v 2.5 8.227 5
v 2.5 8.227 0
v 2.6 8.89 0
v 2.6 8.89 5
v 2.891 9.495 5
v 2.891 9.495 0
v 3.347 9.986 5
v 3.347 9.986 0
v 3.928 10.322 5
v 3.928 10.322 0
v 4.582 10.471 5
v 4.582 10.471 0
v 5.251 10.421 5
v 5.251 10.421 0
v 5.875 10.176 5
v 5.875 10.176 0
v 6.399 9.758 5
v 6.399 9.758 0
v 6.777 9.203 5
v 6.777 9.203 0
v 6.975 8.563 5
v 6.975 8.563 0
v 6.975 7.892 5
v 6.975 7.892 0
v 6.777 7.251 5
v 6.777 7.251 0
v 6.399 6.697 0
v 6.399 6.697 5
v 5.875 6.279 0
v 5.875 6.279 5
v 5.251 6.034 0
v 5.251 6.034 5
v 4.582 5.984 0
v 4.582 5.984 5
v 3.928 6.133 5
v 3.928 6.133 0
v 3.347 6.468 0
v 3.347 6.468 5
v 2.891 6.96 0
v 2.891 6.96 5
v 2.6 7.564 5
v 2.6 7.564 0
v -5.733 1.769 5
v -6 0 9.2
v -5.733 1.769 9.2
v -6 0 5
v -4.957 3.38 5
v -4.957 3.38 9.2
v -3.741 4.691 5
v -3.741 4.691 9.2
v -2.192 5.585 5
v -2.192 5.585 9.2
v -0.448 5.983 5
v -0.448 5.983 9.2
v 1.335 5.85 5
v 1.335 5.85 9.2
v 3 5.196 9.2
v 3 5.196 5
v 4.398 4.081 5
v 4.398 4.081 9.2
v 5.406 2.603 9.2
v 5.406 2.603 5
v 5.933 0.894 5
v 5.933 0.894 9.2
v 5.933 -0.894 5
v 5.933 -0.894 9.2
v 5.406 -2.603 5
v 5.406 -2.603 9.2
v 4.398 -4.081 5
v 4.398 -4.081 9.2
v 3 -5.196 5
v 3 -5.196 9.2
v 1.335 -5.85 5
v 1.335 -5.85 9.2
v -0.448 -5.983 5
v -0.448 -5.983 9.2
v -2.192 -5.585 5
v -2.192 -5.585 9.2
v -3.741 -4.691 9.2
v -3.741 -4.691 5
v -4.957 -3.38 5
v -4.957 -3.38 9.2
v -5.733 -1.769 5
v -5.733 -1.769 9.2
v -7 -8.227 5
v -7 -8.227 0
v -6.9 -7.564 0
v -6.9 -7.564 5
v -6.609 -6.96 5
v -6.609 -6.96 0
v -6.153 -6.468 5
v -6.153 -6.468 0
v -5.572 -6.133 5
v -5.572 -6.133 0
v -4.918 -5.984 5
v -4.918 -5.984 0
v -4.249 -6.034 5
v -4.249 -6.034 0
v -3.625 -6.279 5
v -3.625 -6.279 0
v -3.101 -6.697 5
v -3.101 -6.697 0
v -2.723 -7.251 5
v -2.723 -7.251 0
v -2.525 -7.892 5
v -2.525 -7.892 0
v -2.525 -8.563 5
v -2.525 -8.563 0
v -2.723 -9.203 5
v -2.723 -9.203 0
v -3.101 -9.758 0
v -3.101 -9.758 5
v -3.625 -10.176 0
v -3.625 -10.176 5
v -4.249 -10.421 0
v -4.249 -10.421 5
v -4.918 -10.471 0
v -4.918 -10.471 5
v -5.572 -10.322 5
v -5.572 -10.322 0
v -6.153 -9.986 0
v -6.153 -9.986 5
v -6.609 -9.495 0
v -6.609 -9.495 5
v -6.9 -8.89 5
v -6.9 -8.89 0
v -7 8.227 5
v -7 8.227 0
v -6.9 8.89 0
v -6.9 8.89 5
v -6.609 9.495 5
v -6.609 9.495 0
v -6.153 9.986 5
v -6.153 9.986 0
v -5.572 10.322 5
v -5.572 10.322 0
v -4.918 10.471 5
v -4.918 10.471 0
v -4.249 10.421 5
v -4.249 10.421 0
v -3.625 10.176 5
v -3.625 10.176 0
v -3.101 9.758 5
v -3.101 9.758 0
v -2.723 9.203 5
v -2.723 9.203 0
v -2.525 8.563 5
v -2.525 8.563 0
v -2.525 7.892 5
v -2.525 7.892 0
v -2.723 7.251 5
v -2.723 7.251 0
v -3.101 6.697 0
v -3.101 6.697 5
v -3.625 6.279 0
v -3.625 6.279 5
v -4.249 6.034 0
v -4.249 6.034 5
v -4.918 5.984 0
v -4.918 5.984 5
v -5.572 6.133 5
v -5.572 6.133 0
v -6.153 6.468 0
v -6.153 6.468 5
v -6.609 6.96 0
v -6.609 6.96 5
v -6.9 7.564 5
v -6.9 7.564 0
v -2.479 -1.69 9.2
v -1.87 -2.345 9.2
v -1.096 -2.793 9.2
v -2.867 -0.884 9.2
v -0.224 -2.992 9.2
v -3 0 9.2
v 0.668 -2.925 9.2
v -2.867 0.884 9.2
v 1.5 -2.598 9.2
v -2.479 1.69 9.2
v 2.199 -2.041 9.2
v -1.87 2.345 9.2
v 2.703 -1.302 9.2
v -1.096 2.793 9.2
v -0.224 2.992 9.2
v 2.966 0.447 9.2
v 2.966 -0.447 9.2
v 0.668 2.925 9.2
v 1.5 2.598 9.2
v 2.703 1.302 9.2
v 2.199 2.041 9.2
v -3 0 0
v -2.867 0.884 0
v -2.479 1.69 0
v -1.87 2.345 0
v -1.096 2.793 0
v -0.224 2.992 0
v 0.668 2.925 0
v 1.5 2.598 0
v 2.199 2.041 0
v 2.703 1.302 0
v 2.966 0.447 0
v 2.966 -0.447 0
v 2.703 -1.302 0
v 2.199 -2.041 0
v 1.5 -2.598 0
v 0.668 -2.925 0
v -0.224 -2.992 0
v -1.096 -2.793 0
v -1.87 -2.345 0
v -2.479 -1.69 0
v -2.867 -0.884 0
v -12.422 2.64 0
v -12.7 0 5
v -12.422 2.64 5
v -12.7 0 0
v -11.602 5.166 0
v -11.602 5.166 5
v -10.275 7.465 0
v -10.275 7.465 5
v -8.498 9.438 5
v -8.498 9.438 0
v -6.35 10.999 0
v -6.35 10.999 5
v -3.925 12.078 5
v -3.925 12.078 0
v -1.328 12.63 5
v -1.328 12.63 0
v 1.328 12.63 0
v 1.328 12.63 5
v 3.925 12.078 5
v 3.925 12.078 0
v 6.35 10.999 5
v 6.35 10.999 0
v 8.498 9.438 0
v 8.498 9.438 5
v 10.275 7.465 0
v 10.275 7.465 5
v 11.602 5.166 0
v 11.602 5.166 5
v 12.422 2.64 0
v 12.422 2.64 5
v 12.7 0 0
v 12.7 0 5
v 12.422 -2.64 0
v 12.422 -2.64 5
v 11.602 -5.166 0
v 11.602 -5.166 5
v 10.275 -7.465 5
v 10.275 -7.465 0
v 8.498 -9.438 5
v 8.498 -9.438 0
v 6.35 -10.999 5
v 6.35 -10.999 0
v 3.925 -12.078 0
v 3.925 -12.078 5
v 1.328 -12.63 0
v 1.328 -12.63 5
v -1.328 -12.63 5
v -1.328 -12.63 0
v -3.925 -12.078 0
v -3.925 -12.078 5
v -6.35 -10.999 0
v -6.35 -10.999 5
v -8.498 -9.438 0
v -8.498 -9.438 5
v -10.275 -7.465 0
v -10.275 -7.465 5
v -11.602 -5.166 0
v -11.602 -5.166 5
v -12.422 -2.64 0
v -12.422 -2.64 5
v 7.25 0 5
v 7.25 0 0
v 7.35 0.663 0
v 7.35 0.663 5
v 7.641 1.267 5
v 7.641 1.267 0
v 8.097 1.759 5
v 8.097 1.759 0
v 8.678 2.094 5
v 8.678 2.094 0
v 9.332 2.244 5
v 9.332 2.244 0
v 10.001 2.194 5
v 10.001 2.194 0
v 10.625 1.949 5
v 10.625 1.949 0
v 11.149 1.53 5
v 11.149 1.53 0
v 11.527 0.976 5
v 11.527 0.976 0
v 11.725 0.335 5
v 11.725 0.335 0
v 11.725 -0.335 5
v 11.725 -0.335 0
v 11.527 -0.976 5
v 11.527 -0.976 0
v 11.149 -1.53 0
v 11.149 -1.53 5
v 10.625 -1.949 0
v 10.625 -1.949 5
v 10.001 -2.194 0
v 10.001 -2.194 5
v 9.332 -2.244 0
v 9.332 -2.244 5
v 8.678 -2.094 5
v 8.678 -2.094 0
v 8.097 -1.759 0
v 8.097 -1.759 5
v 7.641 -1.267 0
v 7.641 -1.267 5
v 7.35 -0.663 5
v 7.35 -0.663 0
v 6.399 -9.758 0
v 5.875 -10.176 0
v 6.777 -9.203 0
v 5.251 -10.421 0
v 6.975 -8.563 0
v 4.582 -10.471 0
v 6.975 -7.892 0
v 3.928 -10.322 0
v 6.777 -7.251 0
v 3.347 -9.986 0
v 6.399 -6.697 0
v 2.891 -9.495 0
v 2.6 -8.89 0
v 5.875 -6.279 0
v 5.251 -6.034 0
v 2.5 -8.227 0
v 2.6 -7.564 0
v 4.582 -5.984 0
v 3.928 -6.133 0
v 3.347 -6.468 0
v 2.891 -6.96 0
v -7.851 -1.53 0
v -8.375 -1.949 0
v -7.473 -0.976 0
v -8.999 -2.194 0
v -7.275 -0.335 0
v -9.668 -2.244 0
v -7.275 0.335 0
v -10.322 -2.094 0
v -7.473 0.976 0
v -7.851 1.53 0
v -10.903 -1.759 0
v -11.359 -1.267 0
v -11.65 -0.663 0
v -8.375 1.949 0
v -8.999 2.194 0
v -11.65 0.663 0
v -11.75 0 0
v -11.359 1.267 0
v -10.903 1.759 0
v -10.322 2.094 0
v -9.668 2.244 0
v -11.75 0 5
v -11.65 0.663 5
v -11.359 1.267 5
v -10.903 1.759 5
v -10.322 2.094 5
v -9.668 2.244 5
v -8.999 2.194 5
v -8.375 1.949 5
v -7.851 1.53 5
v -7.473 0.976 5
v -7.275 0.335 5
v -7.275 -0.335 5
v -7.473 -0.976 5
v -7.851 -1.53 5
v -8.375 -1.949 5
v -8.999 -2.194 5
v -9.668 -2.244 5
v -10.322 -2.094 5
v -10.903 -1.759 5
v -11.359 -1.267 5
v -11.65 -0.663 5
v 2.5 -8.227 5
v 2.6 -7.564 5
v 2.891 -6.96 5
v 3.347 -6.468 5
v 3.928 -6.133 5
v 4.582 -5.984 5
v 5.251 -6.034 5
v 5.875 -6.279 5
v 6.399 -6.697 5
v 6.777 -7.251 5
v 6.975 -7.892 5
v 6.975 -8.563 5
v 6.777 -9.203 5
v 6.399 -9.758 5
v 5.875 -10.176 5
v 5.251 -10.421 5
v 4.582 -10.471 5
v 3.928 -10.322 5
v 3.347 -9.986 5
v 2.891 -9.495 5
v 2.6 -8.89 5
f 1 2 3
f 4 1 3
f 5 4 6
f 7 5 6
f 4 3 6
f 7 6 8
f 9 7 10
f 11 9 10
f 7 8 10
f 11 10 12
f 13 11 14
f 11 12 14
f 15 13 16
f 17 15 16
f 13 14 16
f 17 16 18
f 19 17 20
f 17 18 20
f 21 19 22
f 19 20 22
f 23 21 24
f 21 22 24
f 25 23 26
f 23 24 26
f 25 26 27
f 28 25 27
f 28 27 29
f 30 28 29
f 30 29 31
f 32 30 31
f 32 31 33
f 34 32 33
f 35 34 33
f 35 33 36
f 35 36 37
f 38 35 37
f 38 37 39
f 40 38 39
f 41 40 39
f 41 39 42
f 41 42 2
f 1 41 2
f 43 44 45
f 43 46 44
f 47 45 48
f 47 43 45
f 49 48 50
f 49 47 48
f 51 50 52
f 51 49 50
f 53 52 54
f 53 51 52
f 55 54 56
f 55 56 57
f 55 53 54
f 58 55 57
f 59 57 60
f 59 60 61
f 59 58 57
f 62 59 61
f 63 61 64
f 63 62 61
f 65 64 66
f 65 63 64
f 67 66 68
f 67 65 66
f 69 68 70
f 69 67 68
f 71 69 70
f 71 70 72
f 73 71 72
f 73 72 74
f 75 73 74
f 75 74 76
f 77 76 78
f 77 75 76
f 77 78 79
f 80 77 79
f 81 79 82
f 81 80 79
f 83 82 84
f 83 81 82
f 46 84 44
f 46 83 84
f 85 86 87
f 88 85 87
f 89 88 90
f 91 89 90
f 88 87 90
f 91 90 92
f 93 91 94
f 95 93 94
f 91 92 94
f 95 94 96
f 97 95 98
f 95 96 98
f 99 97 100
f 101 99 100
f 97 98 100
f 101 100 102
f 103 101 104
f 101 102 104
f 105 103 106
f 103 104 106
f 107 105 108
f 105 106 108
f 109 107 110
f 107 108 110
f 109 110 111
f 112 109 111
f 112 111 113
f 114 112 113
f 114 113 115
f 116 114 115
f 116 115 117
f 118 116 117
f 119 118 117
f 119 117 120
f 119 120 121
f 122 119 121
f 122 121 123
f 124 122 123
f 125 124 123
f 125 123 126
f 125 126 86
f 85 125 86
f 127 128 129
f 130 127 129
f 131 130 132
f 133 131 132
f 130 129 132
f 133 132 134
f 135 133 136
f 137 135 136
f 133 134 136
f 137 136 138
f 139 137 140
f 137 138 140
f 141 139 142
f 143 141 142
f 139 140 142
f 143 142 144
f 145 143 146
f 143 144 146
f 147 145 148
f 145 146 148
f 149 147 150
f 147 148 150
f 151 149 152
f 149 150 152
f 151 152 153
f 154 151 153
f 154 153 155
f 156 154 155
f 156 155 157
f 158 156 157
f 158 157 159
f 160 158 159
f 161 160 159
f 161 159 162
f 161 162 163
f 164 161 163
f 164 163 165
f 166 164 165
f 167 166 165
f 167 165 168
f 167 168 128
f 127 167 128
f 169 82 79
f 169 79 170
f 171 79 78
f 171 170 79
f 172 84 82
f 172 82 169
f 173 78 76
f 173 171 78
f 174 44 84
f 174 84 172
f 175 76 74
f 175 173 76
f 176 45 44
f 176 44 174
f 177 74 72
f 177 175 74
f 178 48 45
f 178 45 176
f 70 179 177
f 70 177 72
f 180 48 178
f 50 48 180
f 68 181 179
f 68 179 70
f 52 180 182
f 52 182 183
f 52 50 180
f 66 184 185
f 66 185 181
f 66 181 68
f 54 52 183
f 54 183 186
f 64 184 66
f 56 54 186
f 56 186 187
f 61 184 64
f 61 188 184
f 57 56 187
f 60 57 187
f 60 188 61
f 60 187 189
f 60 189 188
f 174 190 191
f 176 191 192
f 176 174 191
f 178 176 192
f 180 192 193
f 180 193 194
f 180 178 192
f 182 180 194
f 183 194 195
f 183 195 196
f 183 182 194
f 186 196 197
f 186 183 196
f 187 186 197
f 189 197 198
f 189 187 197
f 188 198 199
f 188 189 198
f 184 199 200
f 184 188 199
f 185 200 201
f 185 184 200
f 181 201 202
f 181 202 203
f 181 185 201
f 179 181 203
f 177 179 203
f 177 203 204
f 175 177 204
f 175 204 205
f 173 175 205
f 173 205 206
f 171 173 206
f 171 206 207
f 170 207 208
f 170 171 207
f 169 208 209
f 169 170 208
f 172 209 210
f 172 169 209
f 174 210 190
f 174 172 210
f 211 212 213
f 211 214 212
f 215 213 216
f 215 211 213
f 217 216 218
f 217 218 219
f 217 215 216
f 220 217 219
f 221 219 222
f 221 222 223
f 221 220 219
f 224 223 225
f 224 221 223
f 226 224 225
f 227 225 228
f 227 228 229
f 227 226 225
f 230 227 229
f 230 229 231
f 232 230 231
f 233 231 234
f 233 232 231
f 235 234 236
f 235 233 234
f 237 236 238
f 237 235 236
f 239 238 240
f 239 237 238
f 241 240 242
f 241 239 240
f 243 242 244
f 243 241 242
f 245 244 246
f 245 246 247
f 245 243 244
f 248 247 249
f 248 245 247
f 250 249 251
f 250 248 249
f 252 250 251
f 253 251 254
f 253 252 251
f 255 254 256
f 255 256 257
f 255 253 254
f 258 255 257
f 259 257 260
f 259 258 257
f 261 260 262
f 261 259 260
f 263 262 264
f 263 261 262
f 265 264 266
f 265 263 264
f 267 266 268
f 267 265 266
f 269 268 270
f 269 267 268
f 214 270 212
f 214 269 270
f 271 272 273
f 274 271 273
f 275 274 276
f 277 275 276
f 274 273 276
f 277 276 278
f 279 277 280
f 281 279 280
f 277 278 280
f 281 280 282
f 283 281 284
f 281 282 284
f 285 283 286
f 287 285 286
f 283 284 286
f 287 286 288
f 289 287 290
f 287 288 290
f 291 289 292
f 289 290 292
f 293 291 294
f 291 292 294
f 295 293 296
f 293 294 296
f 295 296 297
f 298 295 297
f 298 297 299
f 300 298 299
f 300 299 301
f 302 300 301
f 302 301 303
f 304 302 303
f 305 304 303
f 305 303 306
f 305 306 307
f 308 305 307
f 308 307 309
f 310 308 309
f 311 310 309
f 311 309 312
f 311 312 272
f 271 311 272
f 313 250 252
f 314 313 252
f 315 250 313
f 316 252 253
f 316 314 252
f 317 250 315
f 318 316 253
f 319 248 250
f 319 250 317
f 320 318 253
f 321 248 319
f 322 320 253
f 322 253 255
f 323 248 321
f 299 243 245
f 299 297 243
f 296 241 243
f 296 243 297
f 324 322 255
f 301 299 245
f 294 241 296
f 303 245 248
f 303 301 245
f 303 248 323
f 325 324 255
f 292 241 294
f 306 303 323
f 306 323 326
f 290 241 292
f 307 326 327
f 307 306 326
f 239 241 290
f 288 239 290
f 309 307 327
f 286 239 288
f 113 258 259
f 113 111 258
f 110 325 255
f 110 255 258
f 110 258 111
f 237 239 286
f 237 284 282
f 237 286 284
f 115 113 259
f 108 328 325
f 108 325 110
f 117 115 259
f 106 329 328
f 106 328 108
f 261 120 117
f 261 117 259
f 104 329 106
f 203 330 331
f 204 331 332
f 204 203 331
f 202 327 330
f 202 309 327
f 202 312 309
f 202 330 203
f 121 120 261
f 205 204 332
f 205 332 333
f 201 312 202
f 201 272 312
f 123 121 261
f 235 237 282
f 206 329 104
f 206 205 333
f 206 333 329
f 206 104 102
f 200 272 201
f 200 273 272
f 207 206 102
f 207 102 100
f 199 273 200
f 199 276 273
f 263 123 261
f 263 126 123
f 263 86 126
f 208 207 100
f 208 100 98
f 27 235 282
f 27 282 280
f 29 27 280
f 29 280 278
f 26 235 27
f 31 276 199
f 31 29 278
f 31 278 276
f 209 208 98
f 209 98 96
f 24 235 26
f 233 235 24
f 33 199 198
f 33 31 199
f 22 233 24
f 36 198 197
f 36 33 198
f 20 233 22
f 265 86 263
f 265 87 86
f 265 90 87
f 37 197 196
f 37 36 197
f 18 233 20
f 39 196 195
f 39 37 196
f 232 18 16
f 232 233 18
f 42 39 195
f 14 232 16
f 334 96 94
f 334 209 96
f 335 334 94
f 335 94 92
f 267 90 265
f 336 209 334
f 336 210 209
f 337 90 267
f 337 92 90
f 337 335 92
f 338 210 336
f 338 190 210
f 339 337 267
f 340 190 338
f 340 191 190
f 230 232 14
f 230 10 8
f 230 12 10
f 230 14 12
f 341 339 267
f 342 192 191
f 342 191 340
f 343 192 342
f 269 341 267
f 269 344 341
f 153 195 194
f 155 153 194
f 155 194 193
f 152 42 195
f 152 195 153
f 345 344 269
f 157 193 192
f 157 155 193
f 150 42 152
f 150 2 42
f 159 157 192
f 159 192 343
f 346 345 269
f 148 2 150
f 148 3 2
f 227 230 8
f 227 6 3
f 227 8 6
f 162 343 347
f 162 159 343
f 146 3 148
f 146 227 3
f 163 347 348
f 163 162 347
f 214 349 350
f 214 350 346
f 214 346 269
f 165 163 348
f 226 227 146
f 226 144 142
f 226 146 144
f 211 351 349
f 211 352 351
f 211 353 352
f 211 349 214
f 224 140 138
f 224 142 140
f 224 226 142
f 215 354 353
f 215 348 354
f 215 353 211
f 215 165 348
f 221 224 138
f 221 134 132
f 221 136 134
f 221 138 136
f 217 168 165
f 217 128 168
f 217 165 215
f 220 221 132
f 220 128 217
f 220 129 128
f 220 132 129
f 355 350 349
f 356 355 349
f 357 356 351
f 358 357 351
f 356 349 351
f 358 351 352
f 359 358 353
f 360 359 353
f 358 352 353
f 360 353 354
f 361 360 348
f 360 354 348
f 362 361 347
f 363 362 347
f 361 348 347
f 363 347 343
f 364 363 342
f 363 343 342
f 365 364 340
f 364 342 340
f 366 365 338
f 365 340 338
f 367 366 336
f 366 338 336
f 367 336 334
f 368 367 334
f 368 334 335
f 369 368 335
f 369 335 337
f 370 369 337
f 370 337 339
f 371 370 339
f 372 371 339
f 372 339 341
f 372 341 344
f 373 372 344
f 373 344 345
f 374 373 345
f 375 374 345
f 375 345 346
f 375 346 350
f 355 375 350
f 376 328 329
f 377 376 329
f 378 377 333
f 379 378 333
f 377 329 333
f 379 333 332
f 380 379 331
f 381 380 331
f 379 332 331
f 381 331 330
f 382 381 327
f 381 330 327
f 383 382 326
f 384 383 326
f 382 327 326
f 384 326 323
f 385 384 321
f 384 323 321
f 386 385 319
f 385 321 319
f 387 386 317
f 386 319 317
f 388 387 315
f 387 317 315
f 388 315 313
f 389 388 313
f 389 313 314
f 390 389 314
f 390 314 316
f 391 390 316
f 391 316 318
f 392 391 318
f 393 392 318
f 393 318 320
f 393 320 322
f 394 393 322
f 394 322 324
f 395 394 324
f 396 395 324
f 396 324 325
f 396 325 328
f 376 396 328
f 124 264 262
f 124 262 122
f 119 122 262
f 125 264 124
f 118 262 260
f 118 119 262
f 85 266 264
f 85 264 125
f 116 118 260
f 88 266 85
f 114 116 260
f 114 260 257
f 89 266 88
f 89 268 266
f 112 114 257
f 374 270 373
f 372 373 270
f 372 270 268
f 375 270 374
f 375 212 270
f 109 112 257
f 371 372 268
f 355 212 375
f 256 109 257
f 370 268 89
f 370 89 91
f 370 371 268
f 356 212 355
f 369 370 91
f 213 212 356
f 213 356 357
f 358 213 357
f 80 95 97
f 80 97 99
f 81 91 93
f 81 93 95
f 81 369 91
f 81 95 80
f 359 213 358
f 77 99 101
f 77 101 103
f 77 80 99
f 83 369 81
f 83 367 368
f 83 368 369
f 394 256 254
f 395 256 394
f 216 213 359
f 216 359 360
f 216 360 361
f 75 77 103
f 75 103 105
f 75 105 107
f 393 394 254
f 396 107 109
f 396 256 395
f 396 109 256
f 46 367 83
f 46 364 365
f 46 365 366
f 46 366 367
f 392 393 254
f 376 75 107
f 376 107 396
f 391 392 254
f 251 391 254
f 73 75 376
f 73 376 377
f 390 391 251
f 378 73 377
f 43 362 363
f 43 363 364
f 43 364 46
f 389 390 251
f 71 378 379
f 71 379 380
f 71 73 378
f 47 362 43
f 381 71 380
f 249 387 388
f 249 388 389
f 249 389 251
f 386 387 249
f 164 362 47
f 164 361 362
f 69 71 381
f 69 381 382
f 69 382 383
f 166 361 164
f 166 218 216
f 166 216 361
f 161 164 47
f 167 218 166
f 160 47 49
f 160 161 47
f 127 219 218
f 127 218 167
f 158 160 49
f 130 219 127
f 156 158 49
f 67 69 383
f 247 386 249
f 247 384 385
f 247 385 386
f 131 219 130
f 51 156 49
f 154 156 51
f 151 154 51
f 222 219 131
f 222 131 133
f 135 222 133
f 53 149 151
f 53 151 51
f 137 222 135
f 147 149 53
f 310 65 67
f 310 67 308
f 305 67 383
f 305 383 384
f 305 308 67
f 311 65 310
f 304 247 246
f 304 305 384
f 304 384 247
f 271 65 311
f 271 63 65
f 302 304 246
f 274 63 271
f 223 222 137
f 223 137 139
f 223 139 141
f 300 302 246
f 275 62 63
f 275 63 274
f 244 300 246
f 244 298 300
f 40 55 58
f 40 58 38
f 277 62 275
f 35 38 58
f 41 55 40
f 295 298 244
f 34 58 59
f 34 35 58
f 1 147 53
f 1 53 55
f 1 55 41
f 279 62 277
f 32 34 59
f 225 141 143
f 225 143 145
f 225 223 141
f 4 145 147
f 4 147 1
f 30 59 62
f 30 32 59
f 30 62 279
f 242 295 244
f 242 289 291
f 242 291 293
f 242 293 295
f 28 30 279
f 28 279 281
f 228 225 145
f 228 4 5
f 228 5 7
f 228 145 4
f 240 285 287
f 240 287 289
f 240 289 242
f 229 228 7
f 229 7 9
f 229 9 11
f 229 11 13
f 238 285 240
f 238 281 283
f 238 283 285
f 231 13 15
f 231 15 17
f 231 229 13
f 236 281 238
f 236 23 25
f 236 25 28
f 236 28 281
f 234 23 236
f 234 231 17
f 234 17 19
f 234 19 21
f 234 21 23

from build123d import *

# Parameters (mm, degrees)
F3_D     = 4.5
F3_DEPTH = 7
F3_TIP   = 1.3519363928


with BuildPart() as f1:
    # F0 (on Front) → F1 (revolve)
    with BuildSketch(Plane.XZ):
        Polygon((-12.7, 0), (-3, 0), (-3, 9.2), (-6, 9.2), (-6, 5), (-12.7, 5), align=None)
    revolve(axis=Axis((0, 0, 4.6), (0, 0, -1)))

    # F3
    with Locations(Plane.XY.offset(5)):
        with Locations((-4.75, 8.227241336), (-9.5, 0), (-4.75, -8.227241336), (4.75, -8.227241336), (9.5, 0), (4.75, 8.227241336)):
            Hole(F3_D / 2, depth=F3_DEPTH)
            with Locations((0, 0, -(F3_DEPTH + F3_TIP / 2))):  # 118° drill point
                Cone(0, F3_D / 2, F3_TIP, mode=Mode.SUBTRACT)


solid = f1.part
